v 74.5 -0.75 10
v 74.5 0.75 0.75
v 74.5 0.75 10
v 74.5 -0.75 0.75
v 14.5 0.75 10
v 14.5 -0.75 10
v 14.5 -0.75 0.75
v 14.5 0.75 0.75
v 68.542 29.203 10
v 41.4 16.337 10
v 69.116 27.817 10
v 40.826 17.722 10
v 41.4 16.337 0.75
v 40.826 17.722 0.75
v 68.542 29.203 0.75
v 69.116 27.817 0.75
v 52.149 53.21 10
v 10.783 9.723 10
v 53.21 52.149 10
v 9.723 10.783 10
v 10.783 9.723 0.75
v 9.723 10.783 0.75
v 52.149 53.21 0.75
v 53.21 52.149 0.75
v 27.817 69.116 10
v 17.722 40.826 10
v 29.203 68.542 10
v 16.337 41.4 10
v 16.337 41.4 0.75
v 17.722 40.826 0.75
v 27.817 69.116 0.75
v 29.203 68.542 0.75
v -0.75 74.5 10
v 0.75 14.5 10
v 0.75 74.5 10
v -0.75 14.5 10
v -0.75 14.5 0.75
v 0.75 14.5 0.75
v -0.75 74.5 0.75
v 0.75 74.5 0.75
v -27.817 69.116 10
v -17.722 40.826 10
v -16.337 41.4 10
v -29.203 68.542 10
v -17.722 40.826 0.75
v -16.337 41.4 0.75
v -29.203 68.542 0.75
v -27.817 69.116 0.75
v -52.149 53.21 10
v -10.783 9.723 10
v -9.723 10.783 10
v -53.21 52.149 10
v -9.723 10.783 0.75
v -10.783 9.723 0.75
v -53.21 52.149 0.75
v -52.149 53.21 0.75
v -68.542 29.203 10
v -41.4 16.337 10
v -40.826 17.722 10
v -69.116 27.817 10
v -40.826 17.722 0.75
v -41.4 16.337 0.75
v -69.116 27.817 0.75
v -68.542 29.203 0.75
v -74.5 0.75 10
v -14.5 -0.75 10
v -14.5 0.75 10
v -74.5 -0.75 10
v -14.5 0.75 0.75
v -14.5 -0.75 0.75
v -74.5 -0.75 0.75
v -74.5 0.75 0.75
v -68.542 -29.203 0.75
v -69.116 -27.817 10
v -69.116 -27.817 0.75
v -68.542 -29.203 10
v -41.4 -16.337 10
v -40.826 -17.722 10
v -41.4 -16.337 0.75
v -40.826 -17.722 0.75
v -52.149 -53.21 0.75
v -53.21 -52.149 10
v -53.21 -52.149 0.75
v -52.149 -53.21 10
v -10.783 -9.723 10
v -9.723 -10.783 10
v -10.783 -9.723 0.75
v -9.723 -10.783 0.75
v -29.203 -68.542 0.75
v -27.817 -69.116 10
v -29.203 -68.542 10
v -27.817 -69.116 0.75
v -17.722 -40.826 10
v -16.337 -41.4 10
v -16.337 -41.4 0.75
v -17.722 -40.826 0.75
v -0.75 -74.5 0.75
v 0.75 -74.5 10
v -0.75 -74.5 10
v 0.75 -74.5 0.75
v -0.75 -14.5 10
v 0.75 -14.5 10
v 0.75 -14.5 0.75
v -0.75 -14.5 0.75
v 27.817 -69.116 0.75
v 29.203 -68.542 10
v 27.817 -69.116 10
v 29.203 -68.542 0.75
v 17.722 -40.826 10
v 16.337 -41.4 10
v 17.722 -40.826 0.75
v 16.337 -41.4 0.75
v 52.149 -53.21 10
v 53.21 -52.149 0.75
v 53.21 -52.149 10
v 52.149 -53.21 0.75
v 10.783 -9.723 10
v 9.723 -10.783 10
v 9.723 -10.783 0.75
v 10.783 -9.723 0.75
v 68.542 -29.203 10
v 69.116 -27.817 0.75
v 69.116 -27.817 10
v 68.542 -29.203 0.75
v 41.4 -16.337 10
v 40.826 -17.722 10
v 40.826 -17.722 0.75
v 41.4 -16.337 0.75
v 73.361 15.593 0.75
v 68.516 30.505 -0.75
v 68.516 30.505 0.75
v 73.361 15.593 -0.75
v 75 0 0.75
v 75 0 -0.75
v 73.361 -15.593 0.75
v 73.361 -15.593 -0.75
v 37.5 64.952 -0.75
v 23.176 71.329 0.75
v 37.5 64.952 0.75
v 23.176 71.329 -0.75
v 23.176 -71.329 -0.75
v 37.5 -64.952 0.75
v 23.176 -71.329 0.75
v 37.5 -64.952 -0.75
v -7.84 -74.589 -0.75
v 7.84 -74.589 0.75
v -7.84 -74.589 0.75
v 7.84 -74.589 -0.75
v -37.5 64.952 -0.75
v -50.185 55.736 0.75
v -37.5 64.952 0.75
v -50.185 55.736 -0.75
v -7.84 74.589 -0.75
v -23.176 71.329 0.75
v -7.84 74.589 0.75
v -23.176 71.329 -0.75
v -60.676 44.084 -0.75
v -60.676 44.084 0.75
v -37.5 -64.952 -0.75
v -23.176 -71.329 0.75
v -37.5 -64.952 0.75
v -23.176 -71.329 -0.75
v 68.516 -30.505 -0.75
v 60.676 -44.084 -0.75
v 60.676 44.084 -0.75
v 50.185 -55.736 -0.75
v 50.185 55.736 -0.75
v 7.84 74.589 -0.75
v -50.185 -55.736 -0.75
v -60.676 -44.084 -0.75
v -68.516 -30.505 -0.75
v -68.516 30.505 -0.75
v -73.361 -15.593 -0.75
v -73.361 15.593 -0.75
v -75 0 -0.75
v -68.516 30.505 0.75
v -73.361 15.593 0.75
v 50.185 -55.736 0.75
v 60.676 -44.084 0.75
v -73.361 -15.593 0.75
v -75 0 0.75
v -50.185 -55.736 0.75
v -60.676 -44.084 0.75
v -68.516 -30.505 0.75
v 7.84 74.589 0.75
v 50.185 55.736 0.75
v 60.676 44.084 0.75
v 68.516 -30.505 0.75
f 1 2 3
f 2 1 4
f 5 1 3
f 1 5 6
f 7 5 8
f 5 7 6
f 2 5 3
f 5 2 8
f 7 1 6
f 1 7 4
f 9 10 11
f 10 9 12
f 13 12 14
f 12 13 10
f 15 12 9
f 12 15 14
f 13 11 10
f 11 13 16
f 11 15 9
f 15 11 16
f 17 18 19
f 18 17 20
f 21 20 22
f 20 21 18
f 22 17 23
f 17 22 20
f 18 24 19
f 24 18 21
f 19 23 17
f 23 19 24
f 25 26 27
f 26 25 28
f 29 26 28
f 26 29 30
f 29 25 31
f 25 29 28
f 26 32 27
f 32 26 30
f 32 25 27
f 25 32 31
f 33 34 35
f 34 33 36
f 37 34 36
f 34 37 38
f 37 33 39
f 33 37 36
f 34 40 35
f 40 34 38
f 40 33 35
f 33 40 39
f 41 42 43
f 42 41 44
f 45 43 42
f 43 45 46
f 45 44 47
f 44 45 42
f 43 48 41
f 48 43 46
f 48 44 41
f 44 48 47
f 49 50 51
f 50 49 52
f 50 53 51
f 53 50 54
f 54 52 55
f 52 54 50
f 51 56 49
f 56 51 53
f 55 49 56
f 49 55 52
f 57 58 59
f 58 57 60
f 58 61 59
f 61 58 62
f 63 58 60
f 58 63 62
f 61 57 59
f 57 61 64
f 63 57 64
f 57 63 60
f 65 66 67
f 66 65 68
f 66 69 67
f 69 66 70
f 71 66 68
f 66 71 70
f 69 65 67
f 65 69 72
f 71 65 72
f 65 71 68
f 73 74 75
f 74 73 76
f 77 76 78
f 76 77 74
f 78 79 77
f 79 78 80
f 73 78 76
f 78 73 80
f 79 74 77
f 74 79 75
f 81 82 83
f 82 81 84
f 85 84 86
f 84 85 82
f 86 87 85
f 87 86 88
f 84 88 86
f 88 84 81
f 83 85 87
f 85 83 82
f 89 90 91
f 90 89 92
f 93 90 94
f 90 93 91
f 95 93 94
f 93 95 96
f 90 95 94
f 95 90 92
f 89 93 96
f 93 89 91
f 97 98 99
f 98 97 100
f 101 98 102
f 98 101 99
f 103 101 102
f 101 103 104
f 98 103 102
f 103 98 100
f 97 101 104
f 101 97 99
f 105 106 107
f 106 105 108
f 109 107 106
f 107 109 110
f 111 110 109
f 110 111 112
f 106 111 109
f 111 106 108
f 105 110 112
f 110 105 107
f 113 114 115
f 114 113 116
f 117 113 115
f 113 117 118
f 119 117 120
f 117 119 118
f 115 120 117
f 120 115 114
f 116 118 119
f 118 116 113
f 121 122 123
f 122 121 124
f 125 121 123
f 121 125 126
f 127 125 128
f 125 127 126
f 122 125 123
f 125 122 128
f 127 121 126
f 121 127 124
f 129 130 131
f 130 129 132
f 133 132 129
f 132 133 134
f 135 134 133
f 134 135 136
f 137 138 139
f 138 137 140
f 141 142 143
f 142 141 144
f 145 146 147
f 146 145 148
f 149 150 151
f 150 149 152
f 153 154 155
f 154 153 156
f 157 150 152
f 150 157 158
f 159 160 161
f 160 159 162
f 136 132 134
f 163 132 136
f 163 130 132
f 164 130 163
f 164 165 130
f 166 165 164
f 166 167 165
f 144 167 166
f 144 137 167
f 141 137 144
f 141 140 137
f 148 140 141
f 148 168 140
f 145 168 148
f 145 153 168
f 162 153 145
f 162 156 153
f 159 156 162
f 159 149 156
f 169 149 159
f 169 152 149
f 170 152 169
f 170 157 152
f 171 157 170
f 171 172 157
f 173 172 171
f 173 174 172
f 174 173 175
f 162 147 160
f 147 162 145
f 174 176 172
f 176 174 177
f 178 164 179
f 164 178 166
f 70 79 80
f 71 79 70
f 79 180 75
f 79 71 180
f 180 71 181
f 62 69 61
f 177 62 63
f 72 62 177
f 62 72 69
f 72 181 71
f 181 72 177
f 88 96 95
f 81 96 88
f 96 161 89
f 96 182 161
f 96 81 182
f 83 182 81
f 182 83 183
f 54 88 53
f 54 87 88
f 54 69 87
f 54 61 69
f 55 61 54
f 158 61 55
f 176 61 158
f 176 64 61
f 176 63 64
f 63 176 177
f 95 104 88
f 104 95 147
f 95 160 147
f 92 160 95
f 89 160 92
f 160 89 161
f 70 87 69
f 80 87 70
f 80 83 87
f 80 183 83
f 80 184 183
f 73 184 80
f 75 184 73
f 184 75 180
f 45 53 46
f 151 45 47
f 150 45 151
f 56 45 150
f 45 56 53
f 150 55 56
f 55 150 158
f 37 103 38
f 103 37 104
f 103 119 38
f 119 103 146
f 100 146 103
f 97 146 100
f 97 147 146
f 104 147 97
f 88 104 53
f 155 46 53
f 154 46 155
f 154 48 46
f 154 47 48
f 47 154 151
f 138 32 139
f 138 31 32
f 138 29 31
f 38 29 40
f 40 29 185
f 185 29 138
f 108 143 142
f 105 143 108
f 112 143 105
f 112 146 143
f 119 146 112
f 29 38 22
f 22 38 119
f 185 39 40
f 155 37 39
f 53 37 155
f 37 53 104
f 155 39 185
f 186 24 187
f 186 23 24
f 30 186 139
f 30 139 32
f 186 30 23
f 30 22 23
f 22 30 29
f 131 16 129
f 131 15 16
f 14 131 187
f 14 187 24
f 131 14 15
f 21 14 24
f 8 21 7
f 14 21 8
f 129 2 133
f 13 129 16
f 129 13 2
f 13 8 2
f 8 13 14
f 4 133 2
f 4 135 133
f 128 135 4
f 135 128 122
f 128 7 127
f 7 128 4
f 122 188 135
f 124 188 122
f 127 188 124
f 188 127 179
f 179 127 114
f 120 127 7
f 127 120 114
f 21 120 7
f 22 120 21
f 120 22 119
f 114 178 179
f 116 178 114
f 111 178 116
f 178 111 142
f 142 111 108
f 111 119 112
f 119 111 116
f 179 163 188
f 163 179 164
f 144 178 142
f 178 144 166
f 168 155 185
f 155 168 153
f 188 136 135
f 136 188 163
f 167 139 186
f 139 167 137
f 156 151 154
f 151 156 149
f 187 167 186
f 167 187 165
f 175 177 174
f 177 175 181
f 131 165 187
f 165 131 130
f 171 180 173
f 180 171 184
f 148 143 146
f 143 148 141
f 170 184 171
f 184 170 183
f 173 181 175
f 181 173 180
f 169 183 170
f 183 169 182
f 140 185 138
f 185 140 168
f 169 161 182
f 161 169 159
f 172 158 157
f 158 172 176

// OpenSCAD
/*
Copyright 2021 Michael Brohl

Licensed under the Apache License, Version 2.0 (the "License");
you may not use this file except in compliance with the License.
You may obtain a copy of the License at

http://www.apache.org/licenses/LICENSE-2.0

Unless required by applicable law or agreed to in writing, software
distributed under the License is distributed on an "AS IS" BASIS,
WITHOUT WARRANTIES OR CONDITIONS OF ANY KIND, either express or implied.
See the License for the specific language governing permissions and
limitations under the License.
*/

/*
Parametric Bonsai Nebari groundplate for root development.

See README for further explanations. 
*/

// === change the parameters for your needs here ===
// the diameter of the groundplate
groundPlateDia = 150;
// the thickness of the groundplate and dividers
thickness = 1.5;
// the space between two opposite long dividers
centerSpaceDia = 30;
// number of each long and short dividers
dividerCount = 8;
// height of dividers
dividerHeight = 10;
// should we drill a center hole?
drillCenterHole = false;
// the diameter of the center hole
centerHoleDia = 10;

// === don't change anything below ===
groundPlateRadius = groundPlateDia / 2;
centerSpaceRadius = centerSpaceDia / 2;

dividerAngle = 360/dividerCount;

longDividerLength = groundPlateRadius - centerSpaceRadius;
shortDividerLength = longDividerLength / 2;

centerHolegroundPlateRadius = centerHoleDia / 2;

// the groundplate
module groundPlate() {
   cylinder(h = thickness, r1 = groundPlateRadius, r2 = groundPlateRadius, center = true);
}

// a long divider
module longDivider() {
   translate([longDividerLength / 2, 0, dividerHeight / 2])
     cube([longDividerLength, thickness, dividerHeight], center = true);
}

// a short divider
module shortDivider() {
    translate([shortDividerLength / 2, 0, dividerHeight / 2])
      cube([shortDividerLength, thickness, dividerHeight], center = true);
}

// the center hole
module centerHole() {
   cylinder(h = thickness * 2, r1 = centerHolegroundPlateRadius, r2 = centerHolegroundPlateRadius, center = true);
}

// the complete nebari plate
module nebariPlate() {
    union () {
        groundPlate();

        for(i = [0 : dividerCount]) {
            rotate([0, 0, i * dividerAngle]) 
              translate([centerSpaceRadius - 0.5, 0, 0])
                longDivider();

            rotate([0, 0, i * dividerAngle + dividerAngle/2 ])
              translate([centerSpaceRadius + shortDividerLength - 0.5, 0, 0])
                shortDivider();
        }
    }    
}

// putting everything together
if (drillCenterHole) {
    difference() {
        nebariPlate();
        centerHole();
    }
} else {
    nebariPlate();
}
